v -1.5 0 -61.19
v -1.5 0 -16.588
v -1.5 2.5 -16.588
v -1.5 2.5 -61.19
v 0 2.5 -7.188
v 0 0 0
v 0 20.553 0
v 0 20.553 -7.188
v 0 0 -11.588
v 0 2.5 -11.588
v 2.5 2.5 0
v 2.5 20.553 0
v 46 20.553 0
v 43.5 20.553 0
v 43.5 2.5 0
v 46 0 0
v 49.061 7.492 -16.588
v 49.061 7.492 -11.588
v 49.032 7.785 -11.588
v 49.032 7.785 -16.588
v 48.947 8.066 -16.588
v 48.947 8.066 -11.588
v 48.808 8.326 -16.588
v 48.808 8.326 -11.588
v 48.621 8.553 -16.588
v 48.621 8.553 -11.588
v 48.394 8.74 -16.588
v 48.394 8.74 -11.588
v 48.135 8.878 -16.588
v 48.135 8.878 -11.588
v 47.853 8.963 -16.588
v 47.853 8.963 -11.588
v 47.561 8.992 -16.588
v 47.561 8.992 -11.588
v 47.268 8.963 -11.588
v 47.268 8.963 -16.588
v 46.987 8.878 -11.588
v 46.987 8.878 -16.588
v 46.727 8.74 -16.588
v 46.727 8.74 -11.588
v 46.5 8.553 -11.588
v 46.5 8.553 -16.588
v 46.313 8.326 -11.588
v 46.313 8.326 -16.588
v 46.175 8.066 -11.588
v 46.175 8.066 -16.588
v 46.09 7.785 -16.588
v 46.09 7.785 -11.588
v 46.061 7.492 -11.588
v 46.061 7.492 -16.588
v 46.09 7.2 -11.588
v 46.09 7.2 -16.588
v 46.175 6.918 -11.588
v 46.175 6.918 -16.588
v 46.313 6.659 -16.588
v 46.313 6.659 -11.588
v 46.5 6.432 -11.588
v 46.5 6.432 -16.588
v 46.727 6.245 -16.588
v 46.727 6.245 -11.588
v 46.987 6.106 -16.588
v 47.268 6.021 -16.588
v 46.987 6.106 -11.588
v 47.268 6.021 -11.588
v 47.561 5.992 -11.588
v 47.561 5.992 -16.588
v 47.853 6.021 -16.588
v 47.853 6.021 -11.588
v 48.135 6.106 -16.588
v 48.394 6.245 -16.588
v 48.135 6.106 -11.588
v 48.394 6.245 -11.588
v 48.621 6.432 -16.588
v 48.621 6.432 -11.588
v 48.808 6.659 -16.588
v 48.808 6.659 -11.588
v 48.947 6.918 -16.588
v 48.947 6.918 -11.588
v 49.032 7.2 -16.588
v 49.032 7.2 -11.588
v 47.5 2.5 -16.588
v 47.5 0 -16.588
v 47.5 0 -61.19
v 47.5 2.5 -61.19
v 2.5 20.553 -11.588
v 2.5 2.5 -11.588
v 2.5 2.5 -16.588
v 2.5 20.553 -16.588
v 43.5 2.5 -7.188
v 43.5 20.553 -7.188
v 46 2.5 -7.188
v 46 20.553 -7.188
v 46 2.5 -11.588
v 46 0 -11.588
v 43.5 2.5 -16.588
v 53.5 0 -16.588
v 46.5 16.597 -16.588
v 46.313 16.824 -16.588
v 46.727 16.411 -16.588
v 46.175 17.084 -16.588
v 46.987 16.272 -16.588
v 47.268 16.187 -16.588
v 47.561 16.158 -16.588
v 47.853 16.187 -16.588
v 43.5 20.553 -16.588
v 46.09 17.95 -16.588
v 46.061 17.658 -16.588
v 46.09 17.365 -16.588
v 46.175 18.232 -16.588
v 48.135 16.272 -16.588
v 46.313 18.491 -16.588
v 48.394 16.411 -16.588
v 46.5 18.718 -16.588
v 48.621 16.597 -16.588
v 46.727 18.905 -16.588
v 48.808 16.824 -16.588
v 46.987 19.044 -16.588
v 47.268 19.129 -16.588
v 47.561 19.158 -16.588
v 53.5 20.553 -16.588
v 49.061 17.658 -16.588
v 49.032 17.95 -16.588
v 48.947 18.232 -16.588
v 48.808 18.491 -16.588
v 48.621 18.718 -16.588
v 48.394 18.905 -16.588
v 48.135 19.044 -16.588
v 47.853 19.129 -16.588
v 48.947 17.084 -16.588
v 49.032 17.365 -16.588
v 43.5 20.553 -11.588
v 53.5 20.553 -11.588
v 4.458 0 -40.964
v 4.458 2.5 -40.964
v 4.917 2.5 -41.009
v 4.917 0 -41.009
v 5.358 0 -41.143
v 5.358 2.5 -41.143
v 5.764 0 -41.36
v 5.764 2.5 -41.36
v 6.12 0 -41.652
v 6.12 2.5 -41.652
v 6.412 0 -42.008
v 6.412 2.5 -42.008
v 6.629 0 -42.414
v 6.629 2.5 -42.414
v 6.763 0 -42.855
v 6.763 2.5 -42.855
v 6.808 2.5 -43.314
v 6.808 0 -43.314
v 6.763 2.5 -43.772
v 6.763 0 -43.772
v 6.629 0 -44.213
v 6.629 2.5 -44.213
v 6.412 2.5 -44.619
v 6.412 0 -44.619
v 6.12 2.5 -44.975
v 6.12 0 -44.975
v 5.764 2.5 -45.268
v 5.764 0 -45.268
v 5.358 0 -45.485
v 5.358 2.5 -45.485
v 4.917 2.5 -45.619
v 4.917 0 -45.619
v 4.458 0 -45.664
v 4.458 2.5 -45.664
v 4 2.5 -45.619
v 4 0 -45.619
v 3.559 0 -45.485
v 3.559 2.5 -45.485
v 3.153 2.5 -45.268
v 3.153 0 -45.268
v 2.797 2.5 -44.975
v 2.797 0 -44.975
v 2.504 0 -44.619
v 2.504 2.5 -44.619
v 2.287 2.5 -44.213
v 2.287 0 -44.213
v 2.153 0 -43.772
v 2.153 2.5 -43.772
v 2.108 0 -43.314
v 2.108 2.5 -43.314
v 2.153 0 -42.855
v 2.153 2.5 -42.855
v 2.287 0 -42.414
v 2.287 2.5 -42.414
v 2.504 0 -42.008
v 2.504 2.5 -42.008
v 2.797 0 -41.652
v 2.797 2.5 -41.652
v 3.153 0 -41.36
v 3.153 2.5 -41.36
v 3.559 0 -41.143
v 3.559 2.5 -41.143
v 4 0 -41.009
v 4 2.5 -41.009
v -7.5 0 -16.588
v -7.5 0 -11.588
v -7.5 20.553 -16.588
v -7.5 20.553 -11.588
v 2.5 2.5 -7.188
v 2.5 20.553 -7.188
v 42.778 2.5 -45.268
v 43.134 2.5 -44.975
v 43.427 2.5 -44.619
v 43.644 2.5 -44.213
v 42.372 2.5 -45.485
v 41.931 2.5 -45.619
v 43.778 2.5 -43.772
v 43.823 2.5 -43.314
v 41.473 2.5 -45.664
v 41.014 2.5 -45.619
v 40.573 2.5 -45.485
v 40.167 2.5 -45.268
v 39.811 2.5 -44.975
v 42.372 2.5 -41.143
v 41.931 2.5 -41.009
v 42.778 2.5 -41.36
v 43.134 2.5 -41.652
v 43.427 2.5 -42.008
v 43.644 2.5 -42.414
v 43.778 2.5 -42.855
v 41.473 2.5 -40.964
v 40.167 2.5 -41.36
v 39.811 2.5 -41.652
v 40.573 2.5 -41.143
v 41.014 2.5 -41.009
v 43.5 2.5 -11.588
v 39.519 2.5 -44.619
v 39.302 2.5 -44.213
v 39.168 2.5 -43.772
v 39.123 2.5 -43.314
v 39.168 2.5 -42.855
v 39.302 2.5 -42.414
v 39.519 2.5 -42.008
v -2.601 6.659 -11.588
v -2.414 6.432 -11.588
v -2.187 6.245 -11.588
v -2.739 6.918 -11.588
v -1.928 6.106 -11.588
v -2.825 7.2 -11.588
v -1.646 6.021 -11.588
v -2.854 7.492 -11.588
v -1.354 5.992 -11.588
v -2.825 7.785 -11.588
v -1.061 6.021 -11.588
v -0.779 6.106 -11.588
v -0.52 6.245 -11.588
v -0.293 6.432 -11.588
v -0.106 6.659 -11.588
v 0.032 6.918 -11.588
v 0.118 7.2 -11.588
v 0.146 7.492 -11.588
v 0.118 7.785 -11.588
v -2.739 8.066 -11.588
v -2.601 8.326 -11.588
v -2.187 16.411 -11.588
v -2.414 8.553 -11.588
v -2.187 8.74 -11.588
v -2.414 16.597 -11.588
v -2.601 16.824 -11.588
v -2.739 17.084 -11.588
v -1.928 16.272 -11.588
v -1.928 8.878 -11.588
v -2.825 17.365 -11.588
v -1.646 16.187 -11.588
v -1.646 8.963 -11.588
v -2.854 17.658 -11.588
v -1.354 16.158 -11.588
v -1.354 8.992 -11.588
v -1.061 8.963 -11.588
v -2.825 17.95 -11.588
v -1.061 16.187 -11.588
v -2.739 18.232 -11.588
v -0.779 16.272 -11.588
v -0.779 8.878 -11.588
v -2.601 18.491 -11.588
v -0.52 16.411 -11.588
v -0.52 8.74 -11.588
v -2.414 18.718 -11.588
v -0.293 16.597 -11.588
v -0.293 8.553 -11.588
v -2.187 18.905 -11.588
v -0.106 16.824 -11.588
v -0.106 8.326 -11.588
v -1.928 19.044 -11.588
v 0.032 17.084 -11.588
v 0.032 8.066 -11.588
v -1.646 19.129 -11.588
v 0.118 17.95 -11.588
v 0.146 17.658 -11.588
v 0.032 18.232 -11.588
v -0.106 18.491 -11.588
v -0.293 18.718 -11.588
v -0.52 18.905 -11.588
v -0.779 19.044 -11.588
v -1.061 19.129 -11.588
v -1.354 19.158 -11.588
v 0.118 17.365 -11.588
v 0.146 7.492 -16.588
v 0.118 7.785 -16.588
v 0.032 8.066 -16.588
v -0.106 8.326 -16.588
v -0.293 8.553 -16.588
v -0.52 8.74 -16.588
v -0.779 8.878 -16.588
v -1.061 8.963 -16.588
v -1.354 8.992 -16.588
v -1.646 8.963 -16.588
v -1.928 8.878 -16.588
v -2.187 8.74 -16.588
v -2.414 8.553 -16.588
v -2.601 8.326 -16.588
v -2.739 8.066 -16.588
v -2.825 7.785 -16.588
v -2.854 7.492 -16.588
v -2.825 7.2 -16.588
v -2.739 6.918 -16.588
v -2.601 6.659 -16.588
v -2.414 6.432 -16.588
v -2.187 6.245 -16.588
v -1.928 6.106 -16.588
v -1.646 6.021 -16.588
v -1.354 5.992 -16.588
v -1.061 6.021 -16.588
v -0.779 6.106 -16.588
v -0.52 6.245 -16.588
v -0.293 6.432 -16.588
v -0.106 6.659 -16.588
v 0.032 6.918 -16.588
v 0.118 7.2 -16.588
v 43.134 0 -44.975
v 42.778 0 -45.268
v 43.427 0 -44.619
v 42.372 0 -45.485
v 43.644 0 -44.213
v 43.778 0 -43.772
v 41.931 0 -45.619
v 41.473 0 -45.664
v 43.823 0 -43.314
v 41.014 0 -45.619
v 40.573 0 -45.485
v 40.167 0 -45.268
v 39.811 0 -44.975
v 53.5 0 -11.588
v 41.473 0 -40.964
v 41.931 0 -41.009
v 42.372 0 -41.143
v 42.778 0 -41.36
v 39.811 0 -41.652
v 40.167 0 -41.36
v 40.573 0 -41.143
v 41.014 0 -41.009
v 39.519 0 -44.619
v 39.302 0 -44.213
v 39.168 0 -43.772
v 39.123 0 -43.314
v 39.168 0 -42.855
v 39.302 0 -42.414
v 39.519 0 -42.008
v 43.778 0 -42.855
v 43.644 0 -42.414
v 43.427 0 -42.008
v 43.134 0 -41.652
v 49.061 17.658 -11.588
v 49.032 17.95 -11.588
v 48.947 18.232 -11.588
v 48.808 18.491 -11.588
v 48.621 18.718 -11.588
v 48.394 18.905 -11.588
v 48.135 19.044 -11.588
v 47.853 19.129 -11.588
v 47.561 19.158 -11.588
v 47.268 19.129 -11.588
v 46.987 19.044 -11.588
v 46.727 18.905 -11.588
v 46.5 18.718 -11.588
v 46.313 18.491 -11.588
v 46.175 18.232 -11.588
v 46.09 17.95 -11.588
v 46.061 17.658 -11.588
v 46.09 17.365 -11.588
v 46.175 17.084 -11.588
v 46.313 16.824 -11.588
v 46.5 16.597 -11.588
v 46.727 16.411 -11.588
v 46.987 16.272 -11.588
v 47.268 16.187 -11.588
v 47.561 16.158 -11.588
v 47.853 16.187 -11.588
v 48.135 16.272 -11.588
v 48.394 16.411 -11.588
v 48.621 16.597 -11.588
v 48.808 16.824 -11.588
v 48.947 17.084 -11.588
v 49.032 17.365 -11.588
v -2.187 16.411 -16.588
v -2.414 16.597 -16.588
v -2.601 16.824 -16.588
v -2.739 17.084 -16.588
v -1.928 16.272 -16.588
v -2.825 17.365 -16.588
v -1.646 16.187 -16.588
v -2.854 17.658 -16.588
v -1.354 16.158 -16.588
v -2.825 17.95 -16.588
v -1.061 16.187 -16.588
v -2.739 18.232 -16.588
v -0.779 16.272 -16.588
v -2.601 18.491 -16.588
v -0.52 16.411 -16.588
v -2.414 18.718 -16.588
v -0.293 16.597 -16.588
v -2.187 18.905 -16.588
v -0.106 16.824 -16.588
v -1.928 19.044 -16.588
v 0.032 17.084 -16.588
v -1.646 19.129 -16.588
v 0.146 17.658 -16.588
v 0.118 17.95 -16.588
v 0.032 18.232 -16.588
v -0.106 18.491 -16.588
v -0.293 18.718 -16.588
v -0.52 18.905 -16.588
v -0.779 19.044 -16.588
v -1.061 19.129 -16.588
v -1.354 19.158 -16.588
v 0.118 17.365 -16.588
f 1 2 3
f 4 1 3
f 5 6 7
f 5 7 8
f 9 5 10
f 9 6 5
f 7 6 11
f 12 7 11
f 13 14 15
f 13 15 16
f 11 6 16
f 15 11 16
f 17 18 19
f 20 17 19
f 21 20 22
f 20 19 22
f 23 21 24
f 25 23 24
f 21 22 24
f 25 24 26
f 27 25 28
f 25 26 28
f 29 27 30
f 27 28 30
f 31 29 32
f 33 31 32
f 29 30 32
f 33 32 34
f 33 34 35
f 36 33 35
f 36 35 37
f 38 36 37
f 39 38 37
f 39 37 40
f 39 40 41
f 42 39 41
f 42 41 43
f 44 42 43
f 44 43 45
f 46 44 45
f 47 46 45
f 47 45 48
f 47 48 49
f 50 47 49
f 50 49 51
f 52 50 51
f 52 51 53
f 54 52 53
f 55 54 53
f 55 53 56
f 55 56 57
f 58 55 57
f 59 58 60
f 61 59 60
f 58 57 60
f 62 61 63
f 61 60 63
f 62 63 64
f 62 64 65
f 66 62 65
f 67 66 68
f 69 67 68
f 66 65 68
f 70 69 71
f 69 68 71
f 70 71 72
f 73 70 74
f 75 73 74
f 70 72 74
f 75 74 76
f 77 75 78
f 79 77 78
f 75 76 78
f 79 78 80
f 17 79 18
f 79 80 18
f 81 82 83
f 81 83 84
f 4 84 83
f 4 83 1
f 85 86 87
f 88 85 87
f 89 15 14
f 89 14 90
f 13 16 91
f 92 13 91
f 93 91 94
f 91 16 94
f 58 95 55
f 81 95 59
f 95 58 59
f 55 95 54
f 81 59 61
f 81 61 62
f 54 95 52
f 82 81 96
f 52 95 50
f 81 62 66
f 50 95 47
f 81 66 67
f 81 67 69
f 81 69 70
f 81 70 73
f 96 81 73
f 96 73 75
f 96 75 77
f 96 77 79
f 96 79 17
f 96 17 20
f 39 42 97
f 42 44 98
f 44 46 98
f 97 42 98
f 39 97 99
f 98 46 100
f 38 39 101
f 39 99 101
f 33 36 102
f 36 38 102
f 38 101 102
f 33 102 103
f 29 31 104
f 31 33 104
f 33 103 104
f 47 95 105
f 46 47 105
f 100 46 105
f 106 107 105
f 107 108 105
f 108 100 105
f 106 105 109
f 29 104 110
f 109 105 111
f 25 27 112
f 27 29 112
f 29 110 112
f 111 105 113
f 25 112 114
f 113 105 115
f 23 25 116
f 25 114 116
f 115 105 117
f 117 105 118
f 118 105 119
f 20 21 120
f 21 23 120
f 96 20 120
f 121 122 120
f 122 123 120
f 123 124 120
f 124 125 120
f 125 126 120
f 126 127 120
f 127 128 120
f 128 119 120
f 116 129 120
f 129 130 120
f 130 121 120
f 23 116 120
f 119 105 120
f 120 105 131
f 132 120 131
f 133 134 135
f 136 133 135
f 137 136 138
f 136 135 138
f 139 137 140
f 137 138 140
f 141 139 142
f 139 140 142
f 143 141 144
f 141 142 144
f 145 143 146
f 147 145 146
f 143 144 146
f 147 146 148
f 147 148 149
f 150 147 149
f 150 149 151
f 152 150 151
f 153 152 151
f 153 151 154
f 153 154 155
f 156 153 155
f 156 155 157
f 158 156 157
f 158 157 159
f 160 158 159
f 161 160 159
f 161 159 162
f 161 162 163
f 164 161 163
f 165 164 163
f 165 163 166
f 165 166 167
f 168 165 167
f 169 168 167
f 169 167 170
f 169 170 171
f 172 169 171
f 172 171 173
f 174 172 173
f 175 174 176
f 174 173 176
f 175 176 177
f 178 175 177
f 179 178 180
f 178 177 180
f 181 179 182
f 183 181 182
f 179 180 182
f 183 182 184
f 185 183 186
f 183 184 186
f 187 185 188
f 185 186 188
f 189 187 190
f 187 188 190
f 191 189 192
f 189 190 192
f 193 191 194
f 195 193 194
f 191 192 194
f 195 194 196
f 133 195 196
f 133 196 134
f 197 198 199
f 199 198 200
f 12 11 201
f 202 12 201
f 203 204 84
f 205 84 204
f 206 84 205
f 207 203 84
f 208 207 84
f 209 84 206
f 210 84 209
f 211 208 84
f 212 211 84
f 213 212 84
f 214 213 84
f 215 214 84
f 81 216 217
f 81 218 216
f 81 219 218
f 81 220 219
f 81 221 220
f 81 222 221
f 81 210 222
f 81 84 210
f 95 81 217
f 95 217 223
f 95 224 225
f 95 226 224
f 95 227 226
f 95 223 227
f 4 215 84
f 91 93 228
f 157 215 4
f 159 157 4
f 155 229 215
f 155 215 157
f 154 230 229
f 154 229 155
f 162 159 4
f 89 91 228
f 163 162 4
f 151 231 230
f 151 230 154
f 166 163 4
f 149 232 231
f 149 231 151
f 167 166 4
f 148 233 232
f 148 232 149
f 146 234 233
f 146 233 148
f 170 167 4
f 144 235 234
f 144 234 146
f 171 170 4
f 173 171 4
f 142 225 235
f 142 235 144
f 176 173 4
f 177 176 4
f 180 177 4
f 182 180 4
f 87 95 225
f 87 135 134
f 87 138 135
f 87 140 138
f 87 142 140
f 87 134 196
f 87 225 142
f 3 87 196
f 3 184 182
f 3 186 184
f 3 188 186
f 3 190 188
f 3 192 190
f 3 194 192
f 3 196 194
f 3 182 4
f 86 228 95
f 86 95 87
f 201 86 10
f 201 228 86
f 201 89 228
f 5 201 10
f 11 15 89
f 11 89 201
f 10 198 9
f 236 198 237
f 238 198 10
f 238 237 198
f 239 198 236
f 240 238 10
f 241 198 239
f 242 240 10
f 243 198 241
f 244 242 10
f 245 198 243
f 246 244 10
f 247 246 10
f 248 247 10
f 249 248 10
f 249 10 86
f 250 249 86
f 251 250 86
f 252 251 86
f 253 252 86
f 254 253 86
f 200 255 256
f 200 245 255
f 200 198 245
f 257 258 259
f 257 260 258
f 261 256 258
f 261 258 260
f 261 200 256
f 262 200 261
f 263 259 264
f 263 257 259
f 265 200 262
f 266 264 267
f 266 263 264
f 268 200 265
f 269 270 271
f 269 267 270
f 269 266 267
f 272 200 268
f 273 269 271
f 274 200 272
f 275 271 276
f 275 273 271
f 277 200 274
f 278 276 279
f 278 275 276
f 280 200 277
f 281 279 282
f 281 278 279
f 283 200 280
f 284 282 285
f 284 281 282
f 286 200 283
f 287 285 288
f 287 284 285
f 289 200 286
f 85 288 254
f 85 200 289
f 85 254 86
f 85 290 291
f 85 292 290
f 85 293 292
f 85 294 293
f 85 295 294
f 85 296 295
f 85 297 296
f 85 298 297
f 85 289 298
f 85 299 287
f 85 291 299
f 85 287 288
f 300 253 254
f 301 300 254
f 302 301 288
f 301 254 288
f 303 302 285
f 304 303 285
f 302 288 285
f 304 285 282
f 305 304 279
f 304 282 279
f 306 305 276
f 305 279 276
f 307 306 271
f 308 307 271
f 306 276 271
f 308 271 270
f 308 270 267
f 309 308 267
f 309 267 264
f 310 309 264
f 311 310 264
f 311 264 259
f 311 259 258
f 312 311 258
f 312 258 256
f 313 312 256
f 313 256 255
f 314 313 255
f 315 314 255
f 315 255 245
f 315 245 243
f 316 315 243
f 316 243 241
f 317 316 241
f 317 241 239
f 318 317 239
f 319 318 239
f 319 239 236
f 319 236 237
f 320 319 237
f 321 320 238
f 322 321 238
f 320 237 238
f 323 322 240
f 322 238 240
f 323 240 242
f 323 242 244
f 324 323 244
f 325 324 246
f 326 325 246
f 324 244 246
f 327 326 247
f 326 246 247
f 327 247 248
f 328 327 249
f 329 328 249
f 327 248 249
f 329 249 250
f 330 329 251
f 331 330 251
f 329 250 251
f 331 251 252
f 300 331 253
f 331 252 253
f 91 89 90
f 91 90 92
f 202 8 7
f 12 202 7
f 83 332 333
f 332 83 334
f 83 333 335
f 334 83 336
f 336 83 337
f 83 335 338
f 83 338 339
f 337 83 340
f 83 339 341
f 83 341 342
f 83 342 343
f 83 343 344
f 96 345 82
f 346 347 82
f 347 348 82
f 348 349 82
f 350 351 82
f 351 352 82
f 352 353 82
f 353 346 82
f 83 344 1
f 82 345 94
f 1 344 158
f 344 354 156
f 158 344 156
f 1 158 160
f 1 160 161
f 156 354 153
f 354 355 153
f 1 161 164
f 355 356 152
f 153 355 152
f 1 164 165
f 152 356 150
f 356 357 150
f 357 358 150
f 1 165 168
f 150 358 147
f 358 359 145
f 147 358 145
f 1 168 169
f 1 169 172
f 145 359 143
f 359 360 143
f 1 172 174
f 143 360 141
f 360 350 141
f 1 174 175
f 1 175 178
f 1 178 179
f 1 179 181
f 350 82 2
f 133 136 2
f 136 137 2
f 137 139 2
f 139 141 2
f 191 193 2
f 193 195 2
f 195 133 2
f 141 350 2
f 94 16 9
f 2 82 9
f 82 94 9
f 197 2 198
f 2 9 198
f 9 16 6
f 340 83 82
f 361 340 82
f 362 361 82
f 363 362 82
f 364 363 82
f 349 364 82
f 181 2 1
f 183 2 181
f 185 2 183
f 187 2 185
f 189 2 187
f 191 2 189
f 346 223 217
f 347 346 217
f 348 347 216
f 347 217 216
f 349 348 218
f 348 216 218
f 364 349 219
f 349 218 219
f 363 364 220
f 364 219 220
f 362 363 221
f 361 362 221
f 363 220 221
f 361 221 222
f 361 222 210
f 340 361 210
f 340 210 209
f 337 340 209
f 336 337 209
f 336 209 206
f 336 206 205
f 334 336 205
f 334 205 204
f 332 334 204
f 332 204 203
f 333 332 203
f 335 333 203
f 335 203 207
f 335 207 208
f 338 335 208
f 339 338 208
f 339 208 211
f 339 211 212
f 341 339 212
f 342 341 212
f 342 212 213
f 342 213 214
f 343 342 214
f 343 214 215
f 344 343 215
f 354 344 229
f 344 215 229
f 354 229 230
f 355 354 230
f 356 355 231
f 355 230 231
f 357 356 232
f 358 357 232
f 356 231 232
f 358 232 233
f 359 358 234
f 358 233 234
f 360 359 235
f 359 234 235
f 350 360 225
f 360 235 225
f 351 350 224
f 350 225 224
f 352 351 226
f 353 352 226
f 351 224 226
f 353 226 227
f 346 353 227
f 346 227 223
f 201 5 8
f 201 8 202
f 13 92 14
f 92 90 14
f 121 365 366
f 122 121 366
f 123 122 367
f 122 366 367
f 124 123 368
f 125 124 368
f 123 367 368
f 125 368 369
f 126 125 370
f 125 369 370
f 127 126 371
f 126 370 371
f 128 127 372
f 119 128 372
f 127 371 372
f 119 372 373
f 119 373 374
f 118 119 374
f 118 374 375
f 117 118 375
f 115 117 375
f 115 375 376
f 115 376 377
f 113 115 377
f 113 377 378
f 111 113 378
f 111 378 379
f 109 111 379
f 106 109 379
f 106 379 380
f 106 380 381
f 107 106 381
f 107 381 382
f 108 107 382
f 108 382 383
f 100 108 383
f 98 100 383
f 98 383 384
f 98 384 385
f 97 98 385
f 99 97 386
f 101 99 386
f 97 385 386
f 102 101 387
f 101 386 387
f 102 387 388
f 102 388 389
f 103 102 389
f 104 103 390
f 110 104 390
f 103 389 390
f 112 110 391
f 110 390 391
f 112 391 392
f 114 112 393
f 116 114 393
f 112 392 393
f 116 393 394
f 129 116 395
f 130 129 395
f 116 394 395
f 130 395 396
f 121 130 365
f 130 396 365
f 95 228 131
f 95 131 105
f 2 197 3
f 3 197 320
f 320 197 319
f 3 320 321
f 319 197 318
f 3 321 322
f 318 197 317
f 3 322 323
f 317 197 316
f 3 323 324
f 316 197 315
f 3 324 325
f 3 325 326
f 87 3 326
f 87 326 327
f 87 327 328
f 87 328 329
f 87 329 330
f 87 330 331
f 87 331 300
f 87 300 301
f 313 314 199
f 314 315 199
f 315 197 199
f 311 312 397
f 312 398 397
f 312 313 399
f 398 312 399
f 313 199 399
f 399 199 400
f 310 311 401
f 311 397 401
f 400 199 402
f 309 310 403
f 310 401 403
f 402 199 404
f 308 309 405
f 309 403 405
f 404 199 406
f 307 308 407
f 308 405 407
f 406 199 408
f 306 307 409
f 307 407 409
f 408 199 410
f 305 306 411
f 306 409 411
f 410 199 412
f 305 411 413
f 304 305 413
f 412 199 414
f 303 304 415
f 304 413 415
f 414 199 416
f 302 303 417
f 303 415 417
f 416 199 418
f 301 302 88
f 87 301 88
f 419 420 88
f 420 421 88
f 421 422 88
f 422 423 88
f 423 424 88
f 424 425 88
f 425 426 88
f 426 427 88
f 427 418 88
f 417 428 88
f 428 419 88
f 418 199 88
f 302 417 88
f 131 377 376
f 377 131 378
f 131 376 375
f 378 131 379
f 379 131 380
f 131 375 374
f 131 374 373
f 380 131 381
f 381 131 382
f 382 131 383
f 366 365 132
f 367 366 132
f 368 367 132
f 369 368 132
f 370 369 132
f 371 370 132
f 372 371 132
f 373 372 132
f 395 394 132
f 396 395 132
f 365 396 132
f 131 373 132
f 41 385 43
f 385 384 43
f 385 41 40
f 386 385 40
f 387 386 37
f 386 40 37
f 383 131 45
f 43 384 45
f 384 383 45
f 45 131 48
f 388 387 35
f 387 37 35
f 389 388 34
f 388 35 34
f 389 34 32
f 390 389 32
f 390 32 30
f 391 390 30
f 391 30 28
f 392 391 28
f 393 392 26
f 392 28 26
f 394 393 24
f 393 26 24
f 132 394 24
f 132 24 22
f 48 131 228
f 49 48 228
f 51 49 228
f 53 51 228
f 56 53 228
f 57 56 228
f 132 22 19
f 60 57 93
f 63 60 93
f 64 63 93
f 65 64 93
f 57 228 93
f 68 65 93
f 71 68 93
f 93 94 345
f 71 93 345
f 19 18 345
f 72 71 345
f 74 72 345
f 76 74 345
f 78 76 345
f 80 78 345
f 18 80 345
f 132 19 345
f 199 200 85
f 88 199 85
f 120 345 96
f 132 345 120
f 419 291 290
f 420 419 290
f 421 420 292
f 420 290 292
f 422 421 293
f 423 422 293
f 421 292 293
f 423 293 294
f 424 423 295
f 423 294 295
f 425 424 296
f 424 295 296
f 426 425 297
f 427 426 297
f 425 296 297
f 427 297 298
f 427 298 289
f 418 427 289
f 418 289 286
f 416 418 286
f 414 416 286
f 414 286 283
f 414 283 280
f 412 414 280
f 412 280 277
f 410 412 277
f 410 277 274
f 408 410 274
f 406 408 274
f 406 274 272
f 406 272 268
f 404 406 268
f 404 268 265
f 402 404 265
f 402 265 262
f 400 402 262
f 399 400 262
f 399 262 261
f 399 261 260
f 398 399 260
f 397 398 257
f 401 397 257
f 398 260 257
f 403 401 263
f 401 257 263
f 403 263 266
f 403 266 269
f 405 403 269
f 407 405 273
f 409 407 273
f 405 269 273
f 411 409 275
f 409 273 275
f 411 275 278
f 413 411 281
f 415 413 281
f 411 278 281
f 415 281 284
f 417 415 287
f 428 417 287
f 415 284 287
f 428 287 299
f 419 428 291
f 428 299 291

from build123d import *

# Parameters (mm, degrees)
SKETCH1_W           = 46
SKETCH1_H           = 36.614031046
BOSS_EXTRUDE1_DEPTH = 2.5
SKETCH2_W           = 2.5
SKETCH2_H           = 25.026075356
SKETCH2_H_2         = 7.18795569
BOSS_EXTRUDE2_DEPTH = 20.83511976
SKETCH4_W           = 10
SKETCH4_H           = 20.552854399
BOSS_EXTRUDE8_DEPTH = 5
SKETCH5_W           = 20.026075356
SKETCH5_H           = 23.33511976
CUT_EXTRUDE1_DEPTH  = 100
SKETCH6_W           = 49
SKETCH6_H           = 2.5
BOSS_EXTRUDE9_DEPTH = 44.601756686
SKETCH7_R           = 2.35
CUT_EXTRUDE2_DEPTH  = 57
SKETCH9_W           = 16.58795569
SKETCH9_H           = 2.782265361
CUT_EXTRUDE3_DEPTH  = 47
SKETCH10_R          = 1.5
CUT_EXTRUDE4_DEPTH  = 10


with BuildPart() as part:
    # Sketch1 → Boss-Extrude1 (new body)
    with BuildSketch(Plane(origin=(0, 0, 0), x_dir=(1, 0, 0), z_dir=(0, 1, 0))):
        with Locations((23, 18.307015523)):
            Rectangle(SKETCH1_W, SKETCH1_H)
    extrude(amount=BOSS_EXTRUDE1_DEPTH)

    # Sketch2 → Boss-Extrude2 (add)
    with BuildSketch(Plane(origin=(0, 2.5, 0), x_dir=(1, 0, 0), z_dir=(0, 1, 0))):
        with Locations((1.25, 24.100993368)):
            Rectangle(SKETCH2_W, SKETCH2_H)
        with Locations((1.25, 3.593977845)):
            Rectangle(SKETCH2_W, SKETCH2_H_2)
        with Locations((44.75, 3.593977845)):
            Rectangle(SKETCH2_W, SKETCH2_H_2)
        with Locations((44.75, 24.100993368)):
            Rectangle(SKETCH2_W, SKETCH2_H)
    extrude(amount=BOSS_EXTRUDE2_DEPTH)

    # Sketch4 → Boss-Extrude8 (add)
    with BuildSketch(Plane.XY.offset(-11.58795569)):
        with Locations((-2.5, 10.2764272)):
            Rectangle(SKETCH4_W, SKETCH4_H)
        with Locations((48.5, 10.2764272)):
            Rectangle(SKETCH4_W, SKETCH4_H)
    extrude(amount=-BOSS_EXTRUDE8_DEPTH)

    # Sketch5 → Cut-Extrude1 (cut)
    with BuildSketch(Plane.ZY):
        with Locations((-26.600993368, 11.66755988)):
            Rectangle(SKETCH5_W, SKETCH5_H)
    extrude(amount=-CUT_EXTRUDE1_DEPTH, mode=Mode.SUBTRACT)

    # Sketch6 → Boss-Extrude9 (add)
    with BuildSketch(Plane(origin=(0, 0, -16.58795569), x_dir=(-1, 0, 0), z_dir=(0, 0, -1))):
        with Locations((-23, 1.25)):
            Rectangle(SKETCH6_W, SKETCH6_H)
    extrude(amount=BOSS_EXTRUDE9_DEPTH)

    # Sketch7 → Cut-Extrude2 (cut)
    with BuildSketch(Plane(origin=(0, 2.5, 0), x_dir=(1, 0, 0), z_dir=(0, 1, 0))):
        with Locations(Location((4.458214718, 43.313777074, 0), (0, 0, 270))):
            Circle(SKETCH7_R)
        with Locations(Location((41.472783072, 43.313777074, 0), (0, 0, 270))):
            Circle(SKETCH7_R)
    extrude(amount=-CUT_EXTRUDE2_DEPTH, mode=Mode.SUBTRACT)

    # Sketch9 → Cut-Extrude3 (cut)
    with BuildSketch(Plane.ZY):
        with Locations((-8.293977845, 21.94398708)):
            Rectangle(SKETCH9_W, SKETCH9_H)
    extrude(amount=-CUT_EXTRUDE3_DEPTH, mode=Mode.SUBTRACT)

    # Sketch10 → Cut-Extrude4 (cut)
    with BuildSketch(Plane.XY.offset(-11.58795569)):
        with Locations((-1.353500868, 17.657737488)):
            Circle(SKETCH10_R)
        with Locations((-1.353500868, 7.492318257)):
            Circle(SKETCH10_R)
        with Locations((47.56068481, 17.657737488)):
            Circle(SKETCH10_R)
        with Locations((47.56068481, 7.492318257)):
            Circle(SKETCH10_R)
    extrude(amount=-CUT_EXTRUDE4_DEPTH, mode=Mode.SUBTRACT)


solid = part.part
